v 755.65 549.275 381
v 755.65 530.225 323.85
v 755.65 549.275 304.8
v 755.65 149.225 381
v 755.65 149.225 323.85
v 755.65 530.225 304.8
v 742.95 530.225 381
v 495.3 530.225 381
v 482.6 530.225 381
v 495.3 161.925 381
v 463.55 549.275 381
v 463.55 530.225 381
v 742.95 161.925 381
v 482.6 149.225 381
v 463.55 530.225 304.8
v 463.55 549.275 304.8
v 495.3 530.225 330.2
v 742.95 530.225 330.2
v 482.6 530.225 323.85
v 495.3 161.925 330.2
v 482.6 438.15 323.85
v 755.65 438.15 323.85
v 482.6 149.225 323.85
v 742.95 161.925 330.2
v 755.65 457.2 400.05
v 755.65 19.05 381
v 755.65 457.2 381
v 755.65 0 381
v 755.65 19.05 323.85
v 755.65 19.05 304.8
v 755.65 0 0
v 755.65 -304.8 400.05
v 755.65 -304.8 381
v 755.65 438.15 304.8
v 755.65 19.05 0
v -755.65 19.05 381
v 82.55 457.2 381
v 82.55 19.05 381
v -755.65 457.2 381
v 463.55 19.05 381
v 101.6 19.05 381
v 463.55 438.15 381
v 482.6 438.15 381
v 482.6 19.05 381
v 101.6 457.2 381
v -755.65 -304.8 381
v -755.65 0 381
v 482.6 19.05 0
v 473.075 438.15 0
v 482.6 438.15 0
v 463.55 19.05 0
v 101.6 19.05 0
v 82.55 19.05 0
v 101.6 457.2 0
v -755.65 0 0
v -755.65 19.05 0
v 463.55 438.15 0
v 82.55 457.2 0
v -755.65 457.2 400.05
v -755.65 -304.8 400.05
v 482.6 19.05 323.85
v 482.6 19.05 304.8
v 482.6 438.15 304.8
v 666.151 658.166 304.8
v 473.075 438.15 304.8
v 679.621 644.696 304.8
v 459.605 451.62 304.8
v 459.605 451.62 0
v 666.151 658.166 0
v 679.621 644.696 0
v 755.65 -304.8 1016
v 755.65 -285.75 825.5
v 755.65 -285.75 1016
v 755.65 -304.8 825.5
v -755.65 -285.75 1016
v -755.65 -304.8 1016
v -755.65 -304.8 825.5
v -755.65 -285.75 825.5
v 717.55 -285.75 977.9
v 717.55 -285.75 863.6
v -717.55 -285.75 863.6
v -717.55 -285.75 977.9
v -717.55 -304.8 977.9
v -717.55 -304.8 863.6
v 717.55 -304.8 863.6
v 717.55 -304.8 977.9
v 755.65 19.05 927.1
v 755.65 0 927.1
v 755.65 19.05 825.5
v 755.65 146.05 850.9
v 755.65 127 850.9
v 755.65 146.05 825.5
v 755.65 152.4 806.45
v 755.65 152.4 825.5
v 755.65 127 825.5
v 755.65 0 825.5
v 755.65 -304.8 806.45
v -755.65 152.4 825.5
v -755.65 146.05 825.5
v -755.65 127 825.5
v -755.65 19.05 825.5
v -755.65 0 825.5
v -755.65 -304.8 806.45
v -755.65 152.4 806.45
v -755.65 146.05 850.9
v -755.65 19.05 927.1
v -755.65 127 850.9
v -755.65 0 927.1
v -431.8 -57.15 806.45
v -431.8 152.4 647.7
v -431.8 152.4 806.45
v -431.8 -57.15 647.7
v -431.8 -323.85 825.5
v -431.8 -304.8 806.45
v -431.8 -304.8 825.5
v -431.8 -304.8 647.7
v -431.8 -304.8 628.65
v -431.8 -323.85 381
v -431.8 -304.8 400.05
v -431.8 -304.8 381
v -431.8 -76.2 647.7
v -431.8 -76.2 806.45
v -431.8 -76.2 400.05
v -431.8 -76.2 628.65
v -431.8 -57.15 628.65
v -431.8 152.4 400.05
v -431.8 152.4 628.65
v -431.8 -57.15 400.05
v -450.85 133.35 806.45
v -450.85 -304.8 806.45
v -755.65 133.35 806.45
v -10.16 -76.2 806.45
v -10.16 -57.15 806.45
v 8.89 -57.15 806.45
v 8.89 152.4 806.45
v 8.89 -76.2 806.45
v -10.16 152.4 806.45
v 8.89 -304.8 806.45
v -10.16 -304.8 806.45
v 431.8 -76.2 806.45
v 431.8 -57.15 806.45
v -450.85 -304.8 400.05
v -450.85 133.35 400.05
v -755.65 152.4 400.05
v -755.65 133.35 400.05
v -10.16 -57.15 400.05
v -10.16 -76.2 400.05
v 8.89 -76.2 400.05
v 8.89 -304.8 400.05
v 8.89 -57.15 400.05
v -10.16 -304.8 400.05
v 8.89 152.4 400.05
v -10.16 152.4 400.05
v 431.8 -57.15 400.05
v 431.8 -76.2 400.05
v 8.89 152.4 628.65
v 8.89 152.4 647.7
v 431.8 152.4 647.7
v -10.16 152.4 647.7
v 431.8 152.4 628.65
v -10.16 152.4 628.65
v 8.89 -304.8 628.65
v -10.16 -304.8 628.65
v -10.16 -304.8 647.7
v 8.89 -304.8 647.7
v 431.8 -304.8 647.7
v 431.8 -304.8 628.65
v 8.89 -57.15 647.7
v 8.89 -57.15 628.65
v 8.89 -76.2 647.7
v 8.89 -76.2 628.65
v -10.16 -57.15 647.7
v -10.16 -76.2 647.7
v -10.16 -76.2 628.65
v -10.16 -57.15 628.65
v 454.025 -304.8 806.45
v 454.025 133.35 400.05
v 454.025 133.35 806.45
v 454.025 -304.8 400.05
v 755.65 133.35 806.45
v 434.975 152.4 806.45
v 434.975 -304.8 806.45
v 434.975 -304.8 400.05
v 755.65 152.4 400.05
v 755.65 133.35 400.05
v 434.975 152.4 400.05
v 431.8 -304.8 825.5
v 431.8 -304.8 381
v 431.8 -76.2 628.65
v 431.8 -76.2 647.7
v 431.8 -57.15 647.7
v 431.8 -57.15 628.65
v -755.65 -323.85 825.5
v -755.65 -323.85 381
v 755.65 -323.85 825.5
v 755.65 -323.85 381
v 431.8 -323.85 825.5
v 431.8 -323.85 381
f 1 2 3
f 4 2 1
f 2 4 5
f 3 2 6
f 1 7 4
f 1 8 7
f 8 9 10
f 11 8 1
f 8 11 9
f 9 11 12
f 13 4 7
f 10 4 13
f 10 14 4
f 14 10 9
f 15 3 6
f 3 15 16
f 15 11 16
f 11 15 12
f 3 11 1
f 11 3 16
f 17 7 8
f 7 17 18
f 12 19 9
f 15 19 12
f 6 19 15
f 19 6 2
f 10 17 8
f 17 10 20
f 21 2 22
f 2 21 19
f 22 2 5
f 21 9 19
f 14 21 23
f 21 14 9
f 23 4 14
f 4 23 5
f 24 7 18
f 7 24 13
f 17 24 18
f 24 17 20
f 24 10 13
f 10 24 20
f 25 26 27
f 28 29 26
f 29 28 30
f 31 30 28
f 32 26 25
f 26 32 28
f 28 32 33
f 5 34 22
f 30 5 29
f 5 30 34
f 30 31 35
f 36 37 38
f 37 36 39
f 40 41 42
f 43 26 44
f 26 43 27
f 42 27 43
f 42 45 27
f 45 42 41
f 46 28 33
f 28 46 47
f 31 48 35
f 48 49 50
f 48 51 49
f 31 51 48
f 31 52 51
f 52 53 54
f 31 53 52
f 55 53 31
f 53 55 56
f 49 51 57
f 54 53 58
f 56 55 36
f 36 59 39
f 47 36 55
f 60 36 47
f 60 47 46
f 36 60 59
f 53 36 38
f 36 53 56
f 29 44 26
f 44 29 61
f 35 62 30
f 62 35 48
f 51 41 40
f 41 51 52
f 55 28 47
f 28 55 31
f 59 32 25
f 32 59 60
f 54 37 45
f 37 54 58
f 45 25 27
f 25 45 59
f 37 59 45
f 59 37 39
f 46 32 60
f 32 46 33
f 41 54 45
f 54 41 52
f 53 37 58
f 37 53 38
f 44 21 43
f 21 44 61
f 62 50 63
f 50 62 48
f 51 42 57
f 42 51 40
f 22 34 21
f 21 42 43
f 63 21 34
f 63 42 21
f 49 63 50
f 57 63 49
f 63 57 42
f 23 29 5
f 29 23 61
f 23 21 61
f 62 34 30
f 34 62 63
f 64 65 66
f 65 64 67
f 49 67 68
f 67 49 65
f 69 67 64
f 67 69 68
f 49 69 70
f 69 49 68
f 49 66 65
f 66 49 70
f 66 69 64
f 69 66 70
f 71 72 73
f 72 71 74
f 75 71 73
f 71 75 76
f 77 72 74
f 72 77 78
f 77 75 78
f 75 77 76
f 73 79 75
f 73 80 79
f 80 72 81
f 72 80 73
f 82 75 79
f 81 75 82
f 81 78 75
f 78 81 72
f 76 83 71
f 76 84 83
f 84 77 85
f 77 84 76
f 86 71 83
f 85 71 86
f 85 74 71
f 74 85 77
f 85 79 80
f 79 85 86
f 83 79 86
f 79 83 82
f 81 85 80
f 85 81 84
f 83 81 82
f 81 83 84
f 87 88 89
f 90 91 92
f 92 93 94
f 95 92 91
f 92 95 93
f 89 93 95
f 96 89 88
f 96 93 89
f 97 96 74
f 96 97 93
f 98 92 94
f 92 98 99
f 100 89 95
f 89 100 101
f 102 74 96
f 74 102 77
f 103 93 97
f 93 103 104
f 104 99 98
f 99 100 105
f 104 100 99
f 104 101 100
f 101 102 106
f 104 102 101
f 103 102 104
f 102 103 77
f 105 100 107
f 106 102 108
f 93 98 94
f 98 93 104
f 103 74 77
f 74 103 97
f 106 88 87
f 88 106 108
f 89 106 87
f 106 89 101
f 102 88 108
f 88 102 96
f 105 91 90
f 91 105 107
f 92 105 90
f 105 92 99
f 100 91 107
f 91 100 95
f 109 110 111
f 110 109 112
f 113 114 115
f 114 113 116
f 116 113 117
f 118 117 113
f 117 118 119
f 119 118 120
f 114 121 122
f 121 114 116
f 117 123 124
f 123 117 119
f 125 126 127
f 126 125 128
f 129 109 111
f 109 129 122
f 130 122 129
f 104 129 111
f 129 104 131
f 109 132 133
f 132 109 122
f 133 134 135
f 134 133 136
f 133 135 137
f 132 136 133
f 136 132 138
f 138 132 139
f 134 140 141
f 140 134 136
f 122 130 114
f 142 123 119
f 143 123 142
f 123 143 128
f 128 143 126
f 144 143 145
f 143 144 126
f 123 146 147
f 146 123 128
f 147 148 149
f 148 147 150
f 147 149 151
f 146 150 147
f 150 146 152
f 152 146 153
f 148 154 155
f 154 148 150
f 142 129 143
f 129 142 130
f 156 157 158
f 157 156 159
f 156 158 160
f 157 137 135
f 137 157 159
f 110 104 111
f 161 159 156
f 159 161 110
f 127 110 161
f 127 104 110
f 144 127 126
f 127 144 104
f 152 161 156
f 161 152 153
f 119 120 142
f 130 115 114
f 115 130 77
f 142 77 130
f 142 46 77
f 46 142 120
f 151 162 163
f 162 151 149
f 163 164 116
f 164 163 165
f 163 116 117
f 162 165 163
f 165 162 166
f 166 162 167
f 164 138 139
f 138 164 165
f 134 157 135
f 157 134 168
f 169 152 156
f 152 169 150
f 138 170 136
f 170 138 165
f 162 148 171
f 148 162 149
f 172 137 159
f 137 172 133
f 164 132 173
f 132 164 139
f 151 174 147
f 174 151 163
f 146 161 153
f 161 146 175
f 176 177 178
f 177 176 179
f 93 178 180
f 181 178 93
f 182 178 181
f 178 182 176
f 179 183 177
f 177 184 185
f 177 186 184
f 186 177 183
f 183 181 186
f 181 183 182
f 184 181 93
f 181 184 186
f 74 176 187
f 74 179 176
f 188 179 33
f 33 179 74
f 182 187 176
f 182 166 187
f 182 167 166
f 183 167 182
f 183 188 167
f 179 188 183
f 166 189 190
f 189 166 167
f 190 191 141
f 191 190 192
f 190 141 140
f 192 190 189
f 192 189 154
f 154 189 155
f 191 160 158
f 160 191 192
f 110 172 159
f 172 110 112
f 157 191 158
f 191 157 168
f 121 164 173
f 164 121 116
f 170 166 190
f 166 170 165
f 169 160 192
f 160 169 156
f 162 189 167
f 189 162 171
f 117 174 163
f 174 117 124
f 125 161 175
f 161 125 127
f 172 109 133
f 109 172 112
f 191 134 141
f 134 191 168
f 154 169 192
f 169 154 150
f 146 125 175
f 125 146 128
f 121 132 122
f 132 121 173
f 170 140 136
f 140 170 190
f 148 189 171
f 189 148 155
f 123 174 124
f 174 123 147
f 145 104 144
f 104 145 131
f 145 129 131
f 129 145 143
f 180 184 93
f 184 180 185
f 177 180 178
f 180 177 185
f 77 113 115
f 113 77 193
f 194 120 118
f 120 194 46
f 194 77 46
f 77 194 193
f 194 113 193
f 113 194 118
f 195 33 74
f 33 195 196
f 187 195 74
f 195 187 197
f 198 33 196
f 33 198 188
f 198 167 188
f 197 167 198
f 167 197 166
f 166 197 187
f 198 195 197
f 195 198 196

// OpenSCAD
// file: upper_galley.scad
use <../lib/convert.scad>
use <../lib/colors.scad>

cabinet_unit_width = feet(4) + inches(11.5);
main_cabinets_height = inches(16);

module shelf() {
  color_wood()
    cube([cabinet_unit_width, feet(1.5), inches(0.75)]);
}

module spice_rack_wall() {
  color_wood()
    cube([cabinet_unit_width, inches(0.75), inches(4)]);
}

module spice_rack_lip() {
  color_wood()
    cube([cabinet_unit_width, inches(0.75), inches(1)]);
}

module cubby_front() {
  color_wood()
  difference() {
    cube([cabinet_unit_width, inches(0.75), inches(7.5)]);

    translate([inches(1.5), inches(-0.125), inches(1.5)])
      cube([cabinet_unit_width - inches(3), inches(1), inches(4.5)]);
  }
}

module upper_galley() {
  union() {
    translate([0, feet(-1), 0])
      shelf();
    translate([0, feet(-1), inches(0.75)])
      cubby_front();
    translate([0, 0, inches(0.75)])
      spice_rack_wall();
    translate([0, inches(5), inches(0.75)])
      spice_rack_lip();
  }
}

upper_galley();
// file: lower_galley.scad
use <../lib/convert.scad>
use <../lib/colors.scad>
use <./silverware_drawer.scad>

cabinet_unit_width = feet(4) + inches(11.5);

module counter_top() {
  color_hdpe()
    cube([cabinet_unit_width, feet(2.5), inches(0.75)]);
}

module foot_wall() {
  color_wood()
    cube([cabinet_unit_width, inches(0.75), inches(15)]);
}

module bottom_cabinet_divider() {
  color_wood()
    cube([inches(0.75), feet(1.5), inches(15)]);
}

module water_jug_divider() {
  color_wood()
    cube([inches(0.75), feet(1.5) - inches(0.75), inches(15)]);
}

module electrical_cabinet_top() {
  color_wood()
    cube([inches(10.75), feet(1.5) - inches(0.75), inches(0.75)]);
}

module electrical_cabinet_door(open = 0) {
  color_hdpe()
  translate([open * inches(0.75), 0, 0])
  rotate([0, 0, open * 90])
    cube([inches(11.5), inches(0.75), inches(12)]);
}

module lower_galley(silverware_open = 0, electrical_open = 0) {
  union() {
    translate([0, 0, 0])
      foot_wall();
    translate([0, feet(-1), inches(15)])
      counter_top();
    translate([0 + feet(2) + inches(9), 0, 0])
      bottom_cabinet_divider();
    translate([0 + feet(4), 0, 0])
      water_jug_divider();
    translate([0 + feet(4) + inches(0.75), 0, inches(12)])
      electrical_cabinet_top();
    translate([0 + feet(4), feet(1.5) - inches(0.75), 0])
      electrical_cabinet_door(electrical_open);
    translate([0 + feet(4), feet(1.5) - inches(0.75), inches(12)])
      silverware_drawer(silverware_open);
  }
}

lower_galley(0.25, 0.5, 1);
// file: silverware_drawer.scad
use <../lib/convert.scad>
use <../lib/colors.scad>

module silverware_drawer(open = 0) {
  translate([0, open * inches(14.5), 0])
  union() {
    // front
    color_hdpe()
    cube([inches(11.5), inches(0.75), inches(3)]);

    // right side
    color_wood()
    translate([inches(0.75), inches(-15), inches(0.75)])
      cube([inches(0.5), inches(15), inches(2.25)]);

    // left side
    color_wood()
    translate([inches(11), inches(-15), inches(0.75)])
      cube([inches(0.5), inches(15), inches(2.25)]);

    // bottom
    color_wood()
    translate([inches(1), inches(-15), inches(0.75)])
      cube([inches(10), inches(15), inches(0.25)]);

    // back
    color_wood()
    translate([inches(0.75), inches(-15), inches(0.75)])
      cube([inches(10.75), inches(0.5), inches(2.25)]);
  }
}
// file: ../lib/colors.scad
module color_wood() {
  color("#f2ba52")
    children();
}

module color_hdpe() {
  color("#ccd")
    children();
}

module color_steel() {
  color("#888")
    children();
}
// file: ../lib/convert.scad
function inches(in) = in * 25.4;
function feet(ft) = inches(ft * 12);
// main file
use <../lib/convert.scad>
use <../lib/colors.scad>
use <./silverware_drawer.scad>
use <./lower_galley.scad>
use <./upper_galley.scad>

cabinet_unit_width = feet(4) + inches(11.5);
main_cabinets_height = inches(16);

module cabinet_structure() {
  color_wood()
  union() {
    // wall 1
    translate([inches(12), 0, 0])
      cube([inches(0.75), feet(1.5), main_cabinets_height]);

    // wall 2
    translate([feet(2.5) - inches(0.65), 0, 0])
      cube([inches(0.75), feet(1.5), main_cabinets_height]);

    // wall 3
    translate([feet(4) - inches(1.125), 0, 0])
      cube([inches(0.75), feet(1.5), main_cabinets_height]);

    // shelf
    translate([inches(12.75), 0, inches(9)])
      cube([cabinet_unit_width - inches(25.5), feet(1.5), inches(0.75)]);

    // inside/outside wall
    translate([inches(12.75), inches(9), 0])
      cube([cabinet_unit_width - inches(25.5), inches(0.75), main_cabinets_height]);

    // trofast back 1
    translate([0, inches(17.25), 0])
      cube([inches(12), inches(0.75), main_cabinets_height]);

    // trofast back 2
    translate([feet(3) + inches(11.5), inches(17.25), 0])
      cube([inches(12), inches(0.75), main_cabinets_height]);
  }
}

module inside_cabinet_doors(open = 0) {
  small_width = inches(12.75);
  large_width = inches(17.425);
  color_hdpe()
  union() {
    // 1
    translate([small_width, 0, 0])
    translate([open * inches(-0.75), 0, 0])
    rotate([0, 0, open * 90])
    translate([-small_width, inches(-0.75), inches(-17.5)])
      cube([small_width, inches(0.75), inches(17.5)]);
    // 3
    translate([(cabinet_unit_width - small_width), 0, 0])
    translate([open * inches(0.75), 0, 0])
    rotate([0, 0, open * -90])
    translate([0, inches(-0.75), inches(-17.5)])
      cube([small_width, inches(0.75), inches(17.5)]);
  }
}

module teardrop_cabinets(silverware_open = 0, electrical_open = 0, inside_cabinets_open = 0) {
  center_offset = -cabinet_unit_width / 2;
  upper_galley_zoffset = main_cabinets_height + inches(15) +inches(0.75);
  union() {
    translate([center_offset, 0, 0])
      lower_galley(silverware_open, electrical_open);
    translate([center_offset, 0, upper_galley_zoffset])
      upper_galley();

    translate([center_offset, feet(-1), inches(15) + inches(0.75)])
      cabinet_structure();
    translate([center_offset, feet(-1), feet(2) + inches(8.5)])
      inside_cabinet_doors(inside_cabinets_open);
  }
}

teardrop_cabinets(0.25, 0.5, 0);
